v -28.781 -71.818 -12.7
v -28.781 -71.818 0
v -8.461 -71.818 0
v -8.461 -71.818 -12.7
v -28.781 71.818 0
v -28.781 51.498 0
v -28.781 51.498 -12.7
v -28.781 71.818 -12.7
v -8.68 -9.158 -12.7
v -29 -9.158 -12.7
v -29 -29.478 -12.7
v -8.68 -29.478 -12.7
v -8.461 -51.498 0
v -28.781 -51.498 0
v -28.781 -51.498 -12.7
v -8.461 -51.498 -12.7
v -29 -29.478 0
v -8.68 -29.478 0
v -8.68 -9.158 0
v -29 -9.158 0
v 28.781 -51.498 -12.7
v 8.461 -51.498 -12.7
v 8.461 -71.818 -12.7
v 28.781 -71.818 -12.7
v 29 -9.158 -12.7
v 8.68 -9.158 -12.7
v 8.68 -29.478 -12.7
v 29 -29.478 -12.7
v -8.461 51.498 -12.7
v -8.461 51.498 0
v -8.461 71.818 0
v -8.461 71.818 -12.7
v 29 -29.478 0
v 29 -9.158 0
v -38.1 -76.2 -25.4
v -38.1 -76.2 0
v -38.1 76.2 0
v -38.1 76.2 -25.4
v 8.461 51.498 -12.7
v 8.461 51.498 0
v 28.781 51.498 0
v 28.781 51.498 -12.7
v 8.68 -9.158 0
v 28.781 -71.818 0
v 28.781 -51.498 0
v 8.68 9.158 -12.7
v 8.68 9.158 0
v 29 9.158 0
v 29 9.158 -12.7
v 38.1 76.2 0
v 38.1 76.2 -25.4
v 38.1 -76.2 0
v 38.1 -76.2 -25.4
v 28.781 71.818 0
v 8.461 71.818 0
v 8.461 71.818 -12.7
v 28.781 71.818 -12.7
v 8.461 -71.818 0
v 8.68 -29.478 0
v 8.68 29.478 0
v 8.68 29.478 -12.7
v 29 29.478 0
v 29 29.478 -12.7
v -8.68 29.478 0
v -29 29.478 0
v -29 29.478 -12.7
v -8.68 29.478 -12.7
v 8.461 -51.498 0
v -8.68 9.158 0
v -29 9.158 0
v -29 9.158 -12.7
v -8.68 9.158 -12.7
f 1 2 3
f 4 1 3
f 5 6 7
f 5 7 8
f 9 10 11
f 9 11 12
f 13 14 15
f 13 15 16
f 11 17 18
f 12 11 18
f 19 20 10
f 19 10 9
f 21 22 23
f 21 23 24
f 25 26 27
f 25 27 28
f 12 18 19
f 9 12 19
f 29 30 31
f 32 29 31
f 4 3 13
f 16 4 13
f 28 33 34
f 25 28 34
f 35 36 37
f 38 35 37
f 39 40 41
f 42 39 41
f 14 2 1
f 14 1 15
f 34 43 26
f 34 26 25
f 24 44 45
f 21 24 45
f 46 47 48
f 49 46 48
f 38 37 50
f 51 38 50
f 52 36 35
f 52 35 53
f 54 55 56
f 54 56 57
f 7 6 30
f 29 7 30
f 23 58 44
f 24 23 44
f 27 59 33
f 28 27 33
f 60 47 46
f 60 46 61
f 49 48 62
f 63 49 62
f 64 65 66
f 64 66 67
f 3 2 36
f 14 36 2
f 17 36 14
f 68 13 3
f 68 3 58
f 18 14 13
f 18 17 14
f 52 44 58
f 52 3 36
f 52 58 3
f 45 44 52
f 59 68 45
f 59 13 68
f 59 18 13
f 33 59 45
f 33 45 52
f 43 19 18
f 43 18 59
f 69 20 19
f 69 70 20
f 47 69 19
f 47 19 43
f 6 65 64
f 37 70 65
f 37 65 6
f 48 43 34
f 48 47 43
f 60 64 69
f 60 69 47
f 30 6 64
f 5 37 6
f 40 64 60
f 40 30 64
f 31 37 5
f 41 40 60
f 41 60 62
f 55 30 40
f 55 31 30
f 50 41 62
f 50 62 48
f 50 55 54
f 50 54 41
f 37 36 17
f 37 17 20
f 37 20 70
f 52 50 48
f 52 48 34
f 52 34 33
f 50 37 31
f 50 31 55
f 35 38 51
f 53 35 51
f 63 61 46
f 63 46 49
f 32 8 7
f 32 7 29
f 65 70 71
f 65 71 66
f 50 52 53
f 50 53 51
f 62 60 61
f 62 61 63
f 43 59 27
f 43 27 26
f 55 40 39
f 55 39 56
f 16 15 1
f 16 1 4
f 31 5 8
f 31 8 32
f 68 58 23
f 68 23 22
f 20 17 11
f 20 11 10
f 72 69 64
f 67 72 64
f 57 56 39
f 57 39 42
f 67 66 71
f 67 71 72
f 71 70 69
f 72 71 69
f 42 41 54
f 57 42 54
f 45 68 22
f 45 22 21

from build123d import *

# Parameters (mm, degrees)
F0_W     = 76.2
F0_H     = 152.4
F1_DEPTH = 25.4
F2_W     = 20.32
F2_H     = 20.32
F3_DEPTH = 12.7


with BuildPart() as f1:
    # F0 (on Top) → F1 (new body)
    with BuildSketch(Plane.XY):
        Rectangle(F0_W, F0_H)
    extrude(amount=-F1_DEPTH)

    # F2 (on face) → F3 (cut)
    with BuildSketch(Plane.XY):
        with Locations((-18.621309, 61.657559)):
            Rectangle(F2_W, F2_H)
        with Locations((18.621309, 61.657559)):
            Rectangle(F2_W, F2_H)
        with Locations((18.621309, -61.657559)):
            Rectangle(F2_W, F2_H)
        with Locations((-18.621309, -61.657559)):
            Rectangle(F2_W, F2_H)
        with Locations((-18.840398, 19.318015)):
            Rectangle(F2_W, F2_H)
        with Locations((18.840398, 19.318015)):
            Rectangle(F2_W, F2_H)
        with Locations((-18.840398, -19.318015)):
            Rectangle(F2_W, F2_H)
        with Locations((18.840398, -19.318015)):
            Rectangle(F2_W, F2_H)
    extrude(amount=-F3_DEPTH, mode=Mode.SUBTRACT)


solid = f1.part
